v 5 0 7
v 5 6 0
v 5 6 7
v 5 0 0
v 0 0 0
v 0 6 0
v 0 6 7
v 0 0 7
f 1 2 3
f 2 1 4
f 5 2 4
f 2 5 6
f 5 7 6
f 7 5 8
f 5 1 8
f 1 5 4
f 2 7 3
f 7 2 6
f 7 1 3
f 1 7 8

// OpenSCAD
translate([2.5, 1.0, 1.5]) color([0.6055041702213623, 0.19459095568233187, 0.9706919132543499]) cube([5, 2, 3], center=true);
translate([2.5, 3.0, 1.5]) color([0.7181133264593419, 0.47923365392220396, 0.7271552294548347]) cube([5, 2, 3], center=true);
translate([2.5, 5.0, 1.5]) color([0.06108489585644861, 0.6793471949009788, 0.5442354114772292]) cube([5, 2, 3], center=true);
translate([2.5, 1.5, 4.0]) color([0.620599970977755, 0.8359026555711022, 0.07000430092833387]) cube([5, 3, 2], center=true);
translate([2.5, 4.5, 4.0]) color([0.07197168951426236, 0.3010615360013691, 0.43606864795325617]) cube([5, 3, 2], center=true);
translate([2.5, 1.5, 6.0]) color([0.06104243921962749, 0.46713122754826175, 0.5964849226245376]) cube([5, 3, 2], center=true);
translate([2.5, 4.5, 6.0]) color([0.6993231250959273, 0.39127619713064865, 0.2601332542192585]) cube([5, 3, 2], center=true);
